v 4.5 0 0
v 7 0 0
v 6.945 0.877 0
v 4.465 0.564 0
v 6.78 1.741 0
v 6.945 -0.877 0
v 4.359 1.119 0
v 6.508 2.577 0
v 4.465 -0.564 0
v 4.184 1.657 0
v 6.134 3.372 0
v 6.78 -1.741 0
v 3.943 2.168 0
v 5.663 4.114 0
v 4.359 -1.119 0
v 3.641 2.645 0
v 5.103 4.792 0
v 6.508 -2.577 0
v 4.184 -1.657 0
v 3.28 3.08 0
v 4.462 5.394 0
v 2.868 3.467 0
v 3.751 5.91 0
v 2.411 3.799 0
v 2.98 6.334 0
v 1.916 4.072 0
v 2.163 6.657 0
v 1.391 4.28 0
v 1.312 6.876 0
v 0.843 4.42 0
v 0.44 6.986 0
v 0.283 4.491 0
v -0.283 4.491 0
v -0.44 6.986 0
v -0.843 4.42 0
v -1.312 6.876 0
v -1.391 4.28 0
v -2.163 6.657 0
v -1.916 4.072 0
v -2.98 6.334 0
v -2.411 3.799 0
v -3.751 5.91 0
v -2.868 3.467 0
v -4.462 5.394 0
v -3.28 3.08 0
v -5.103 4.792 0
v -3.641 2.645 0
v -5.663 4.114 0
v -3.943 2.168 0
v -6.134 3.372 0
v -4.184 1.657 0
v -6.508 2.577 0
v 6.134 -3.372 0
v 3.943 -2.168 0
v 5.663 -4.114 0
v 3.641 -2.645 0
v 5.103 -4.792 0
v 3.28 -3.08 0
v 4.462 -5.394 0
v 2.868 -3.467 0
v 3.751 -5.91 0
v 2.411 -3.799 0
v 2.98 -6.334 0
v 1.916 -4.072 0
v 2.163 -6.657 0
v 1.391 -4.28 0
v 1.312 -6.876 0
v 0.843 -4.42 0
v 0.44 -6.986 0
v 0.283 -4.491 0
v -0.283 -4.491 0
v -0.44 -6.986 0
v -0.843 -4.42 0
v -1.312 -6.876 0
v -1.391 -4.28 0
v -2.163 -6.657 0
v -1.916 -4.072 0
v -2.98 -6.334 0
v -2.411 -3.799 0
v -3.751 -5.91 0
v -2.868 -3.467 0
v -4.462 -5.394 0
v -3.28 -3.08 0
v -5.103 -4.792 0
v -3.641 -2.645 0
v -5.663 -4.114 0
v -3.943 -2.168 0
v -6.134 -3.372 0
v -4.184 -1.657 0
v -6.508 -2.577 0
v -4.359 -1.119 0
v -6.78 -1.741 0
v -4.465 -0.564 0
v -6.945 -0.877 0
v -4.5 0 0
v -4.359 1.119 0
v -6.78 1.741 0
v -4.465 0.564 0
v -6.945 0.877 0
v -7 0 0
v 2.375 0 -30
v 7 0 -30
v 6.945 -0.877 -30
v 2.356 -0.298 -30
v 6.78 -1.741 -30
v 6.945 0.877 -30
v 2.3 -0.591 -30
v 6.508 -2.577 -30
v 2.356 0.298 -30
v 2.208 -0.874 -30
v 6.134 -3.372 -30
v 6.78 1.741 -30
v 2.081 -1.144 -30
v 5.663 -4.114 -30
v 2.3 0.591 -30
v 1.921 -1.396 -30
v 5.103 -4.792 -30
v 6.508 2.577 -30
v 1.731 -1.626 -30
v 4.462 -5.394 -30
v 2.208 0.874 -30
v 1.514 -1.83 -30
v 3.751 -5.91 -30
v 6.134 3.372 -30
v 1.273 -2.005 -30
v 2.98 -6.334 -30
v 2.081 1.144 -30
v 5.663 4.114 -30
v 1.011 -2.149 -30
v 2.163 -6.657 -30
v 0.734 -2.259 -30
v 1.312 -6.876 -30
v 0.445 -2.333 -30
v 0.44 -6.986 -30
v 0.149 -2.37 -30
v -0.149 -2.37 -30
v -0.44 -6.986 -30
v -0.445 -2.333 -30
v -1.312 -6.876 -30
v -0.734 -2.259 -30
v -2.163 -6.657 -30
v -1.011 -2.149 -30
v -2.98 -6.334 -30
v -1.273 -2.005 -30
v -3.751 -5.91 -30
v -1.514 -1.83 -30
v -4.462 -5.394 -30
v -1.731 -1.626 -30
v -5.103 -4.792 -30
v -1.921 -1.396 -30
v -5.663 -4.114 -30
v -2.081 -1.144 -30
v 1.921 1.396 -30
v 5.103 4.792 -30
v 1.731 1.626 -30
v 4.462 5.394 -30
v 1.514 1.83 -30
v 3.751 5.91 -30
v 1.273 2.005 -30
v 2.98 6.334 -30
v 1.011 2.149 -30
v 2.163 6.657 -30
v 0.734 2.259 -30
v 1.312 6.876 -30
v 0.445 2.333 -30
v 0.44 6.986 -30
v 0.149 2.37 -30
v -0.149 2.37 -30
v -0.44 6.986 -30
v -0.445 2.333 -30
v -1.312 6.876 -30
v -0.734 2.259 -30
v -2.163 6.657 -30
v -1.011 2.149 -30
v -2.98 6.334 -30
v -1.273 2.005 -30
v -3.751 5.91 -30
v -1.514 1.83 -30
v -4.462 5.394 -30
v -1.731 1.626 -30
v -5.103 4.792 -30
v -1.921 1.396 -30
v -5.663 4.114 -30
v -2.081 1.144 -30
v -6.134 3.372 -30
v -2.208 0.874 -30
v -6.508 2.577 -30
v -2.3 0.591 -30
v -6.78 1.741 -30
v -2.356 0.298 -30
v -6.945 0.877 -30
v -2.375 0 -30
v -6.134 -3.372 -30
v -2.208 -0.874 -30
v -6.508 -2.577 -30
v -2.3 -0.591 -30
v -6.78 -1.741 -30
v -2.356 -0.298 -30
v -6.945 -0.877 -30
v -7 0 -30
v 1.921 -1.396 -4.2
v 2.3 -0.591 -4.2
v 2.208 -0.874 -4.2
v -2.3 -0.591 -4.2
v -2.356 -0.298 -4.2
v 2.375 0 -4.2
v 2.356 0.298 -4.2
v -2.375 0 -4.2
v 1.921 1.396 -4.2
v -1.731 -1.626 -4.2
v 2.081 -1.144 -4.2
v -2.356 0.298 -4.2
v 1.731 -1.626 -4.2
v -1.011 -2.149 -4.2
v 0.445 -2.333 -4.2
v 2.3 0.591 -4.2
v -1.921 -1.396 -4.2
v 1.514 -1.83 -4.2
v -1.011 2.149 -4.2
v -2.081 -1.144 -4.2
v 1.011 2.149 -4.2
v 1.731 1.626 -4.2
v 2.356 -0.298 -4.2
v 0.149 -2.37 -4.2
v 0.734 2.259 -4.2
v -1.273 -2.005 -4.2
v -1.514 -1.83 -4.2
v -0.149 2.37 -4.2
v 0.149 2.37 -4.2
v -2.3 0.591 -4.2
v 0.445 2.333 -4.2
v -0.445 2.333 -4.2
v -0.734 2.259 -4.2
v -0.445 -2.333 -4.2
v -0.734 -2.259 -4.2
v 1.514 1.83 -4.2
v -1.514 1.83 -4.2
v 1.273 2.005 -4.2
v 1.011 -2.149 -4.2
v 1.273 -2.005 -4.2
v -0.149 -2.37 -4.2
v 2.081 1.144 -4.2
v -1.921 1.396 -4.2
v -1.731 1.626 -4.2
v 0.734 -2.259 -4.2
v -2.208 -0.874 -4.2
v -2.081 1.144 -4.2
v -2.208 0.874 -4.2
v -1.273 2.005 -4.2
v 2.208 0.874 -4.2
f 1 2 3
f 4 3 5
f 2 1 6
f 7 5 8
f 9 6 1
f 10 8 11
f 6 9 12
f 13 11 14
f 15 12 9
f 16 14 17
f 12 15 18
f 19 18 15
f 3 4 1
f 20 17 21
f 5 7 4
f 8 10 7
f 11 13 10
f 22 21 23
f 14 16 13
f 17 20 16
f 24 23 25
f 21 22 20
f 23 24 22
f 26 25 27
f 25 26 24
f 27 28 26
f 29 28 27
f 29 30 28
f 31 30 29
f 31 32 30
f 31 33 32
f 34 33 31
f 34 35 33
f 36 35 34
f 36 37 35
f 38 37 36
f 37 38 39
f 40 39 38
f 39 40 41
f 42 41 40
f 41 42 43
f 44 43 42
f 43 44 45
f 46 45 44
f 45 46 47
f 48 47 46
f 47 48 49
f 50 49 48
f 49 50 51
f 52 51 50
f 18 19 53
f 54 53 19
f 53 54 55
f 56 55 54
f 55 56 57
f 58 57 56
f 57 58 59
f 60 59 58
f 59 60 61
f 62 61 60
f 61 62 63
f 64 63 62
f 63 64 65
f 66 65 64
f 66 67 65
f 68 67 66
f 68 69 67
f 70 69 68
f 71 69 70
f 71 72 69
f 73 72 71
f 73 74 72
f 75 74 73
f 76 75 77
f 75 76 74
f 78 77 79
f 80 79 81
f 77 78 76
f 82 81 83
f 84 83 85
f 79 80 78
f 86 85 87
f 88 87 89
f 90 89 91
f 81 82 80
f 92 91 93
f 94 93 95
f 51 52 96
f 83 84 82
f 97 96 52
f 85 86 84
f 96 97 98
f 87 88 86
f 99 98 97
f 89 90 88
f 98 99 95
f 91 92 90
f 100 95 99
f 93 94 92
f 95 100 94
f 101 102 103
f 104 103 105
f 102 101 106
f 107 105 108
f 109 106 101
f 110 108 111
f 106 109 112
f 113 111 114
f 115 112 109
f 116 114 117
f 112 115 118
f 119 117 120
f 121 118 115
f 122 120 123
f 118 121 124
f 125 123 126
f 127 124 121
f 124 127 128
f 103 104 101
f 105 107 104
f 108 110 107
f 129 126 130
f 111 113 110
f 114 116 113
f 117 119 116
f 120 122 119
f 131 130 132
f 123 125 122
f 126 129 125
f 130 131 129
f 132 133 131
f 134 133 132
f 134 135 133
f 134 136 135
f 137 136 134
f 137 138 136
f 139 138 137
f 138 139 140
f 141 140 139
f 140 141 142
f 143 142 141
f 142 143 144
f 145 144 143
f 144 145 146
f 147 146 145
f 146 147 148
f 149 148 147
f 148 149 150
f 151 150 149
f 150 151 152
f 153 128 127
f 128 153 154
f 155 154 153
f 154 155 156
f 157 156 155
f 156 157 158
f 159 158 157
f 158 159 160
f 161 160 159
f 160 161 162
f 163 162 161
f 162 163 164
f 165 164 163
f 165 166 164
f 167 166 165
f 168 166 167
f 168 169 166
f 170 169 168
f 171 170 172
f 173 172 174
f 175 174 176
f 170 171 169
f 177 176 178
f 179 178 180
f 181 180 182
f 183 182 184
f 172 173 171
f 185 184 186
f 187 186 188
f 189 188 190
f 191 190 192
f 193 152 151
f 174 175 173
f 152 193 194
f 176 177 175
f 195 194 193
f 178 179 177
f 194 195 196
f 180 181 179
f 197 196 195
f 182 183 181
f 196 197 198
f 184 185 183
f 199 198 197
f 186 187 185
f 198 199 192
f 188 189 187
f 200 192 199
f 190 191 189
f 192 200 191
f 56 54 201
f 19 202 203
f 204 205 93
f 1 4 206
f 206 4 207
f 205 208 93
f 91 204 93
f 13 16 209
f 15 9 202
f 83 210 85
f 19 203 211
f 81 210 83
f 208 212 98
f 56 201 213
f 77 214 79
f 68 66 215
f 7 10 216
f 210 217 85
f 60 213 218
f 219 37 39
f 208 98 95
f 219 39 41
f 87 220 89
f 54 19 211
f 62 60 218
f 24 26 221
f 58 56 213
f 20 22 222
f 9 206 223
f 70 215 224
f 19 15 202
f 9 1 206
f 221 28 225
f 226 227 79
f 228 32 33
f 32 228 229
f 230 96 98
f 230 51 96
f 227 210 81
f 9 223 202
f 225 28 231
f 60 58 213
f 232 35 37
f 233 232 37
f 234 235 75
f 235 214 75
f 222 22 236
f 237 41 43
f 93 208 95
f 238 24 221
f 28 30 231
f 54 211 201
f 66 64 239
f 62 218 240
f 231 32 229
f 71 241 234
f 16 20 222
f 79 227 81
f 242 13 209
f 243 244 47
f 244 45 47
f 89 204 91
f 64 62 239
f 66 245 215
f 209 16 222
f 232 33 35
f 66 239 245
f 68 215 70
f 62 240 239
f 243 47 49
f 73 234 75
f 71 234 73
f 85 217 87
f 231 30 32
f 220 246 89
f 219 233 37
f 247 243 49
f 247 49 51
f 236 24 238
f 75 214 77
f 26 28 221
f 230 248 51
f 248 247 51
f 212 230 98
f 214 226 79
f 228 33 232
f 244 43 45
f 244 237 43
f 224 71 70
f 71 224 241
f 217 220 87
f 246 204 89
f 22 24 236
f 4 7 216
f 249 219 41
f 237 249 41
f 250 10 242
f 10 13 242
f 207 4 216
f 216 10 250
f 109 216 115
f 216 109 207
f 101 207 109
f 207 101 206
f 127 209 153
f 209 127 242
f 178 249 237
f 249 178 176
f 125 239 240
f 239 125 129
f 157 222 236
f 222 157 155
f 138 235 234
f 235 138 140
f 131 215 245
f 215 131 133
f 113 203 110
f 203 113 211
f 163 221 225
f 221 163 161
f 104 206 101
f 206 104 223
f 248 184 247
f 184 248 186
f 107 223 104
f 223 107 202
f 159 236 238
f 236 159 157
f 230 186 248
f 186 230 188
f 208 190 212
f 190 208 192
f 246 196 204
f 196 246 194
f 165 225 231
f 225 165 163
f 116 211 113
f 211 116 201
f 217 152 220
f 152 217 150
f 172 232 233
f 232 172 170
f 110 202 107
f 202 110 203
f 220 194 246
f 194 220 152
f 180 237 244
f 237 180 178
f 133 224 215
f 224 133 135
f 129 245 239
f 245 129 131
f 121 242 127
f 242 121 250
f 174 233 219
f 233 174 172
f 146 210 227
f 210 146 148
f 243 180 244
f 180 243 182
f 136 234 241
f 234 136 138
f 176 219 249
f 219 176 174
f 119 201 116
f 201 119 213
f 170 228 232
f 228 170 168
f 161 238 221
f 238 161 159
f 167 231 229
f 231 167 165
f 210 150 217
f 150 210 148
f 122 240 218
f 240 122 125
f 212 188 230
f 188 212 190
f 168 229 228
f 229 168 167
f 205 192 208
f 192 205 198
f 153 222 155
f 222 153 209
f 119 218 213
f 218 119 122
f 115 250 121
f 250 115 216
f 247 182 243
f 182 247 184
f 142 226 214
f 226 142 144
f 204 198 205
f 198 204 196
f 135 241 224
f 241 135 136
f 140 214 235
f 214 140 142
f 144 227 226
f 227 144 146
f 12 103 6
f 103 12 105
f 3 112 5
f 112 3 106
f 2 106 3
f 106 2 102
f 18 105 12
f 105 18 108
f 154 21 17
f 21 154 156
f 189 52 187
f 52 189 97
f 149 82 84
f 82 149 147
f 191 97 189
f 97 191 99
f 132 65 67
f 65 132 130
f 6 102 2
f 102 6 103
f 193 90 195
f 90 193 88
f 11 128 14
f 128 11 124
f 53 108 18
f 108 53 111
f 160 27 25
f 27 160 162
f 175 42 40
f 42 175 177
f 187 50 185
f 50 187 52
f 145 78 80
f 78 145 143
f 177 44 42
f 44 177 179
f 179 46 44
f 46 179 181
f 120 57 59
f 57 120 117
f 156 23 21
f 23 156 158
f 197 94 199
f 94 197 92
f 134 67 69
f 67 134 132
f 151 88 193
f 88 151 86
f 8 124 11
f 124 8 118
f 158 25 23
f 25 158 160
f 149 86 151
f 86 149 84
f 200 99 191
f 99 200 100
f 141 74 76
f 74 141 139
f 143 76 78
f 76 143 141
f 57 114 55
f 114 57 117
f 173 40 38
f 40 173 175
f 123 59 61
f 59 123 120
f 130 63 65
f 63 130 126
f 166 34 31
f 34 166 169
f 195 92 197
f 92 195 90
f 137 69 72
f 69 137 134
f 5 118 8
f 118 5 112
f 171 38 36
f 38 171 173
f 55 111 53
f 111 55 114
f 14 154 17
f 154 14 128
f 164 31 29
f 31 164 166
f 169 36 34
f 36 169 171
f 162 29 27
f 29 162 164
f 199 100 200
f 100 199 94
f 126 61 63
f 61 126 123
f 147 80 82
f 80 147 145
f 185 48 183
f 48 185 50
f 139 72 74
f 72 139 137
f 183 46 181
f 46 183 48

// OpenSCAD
$fn = 50;


difference() {
	union() {
		translate(v = [0, 0, -30.0000000000]) {
			cylinder(h = 30, r = 7.0000000000);
		}
		cylinder(h = 0, r = 10.0000000000);
	}
	union() {
		translate(v = [0, 0, 0]) {
			rotate(a = [0, 0, 0]) {
				difference() {
					union() {
						#translate(v = [0, 0, -30.0000000000]) {
							cylinder(h = 30, r = 2.2500000000);
						}
						#translate(v = [0, 0, -4.2000000000]) {
							cylinder(h = 4.2000000000, r = 7.0000000000, r1 = 2.3750000000, r2 = 4.5000000000);
						}
						#translate(v = [0, 0, -30.0000000000]) {
							cylinder(h = 30, r = 2.3750000000);
						}
						#translate(v = [0, 0, -30.0000000000]) {
							cylinder(h = 30, r = 2.2500000000);
						}
					}
					union();
				}
			}
		}
	}
}
